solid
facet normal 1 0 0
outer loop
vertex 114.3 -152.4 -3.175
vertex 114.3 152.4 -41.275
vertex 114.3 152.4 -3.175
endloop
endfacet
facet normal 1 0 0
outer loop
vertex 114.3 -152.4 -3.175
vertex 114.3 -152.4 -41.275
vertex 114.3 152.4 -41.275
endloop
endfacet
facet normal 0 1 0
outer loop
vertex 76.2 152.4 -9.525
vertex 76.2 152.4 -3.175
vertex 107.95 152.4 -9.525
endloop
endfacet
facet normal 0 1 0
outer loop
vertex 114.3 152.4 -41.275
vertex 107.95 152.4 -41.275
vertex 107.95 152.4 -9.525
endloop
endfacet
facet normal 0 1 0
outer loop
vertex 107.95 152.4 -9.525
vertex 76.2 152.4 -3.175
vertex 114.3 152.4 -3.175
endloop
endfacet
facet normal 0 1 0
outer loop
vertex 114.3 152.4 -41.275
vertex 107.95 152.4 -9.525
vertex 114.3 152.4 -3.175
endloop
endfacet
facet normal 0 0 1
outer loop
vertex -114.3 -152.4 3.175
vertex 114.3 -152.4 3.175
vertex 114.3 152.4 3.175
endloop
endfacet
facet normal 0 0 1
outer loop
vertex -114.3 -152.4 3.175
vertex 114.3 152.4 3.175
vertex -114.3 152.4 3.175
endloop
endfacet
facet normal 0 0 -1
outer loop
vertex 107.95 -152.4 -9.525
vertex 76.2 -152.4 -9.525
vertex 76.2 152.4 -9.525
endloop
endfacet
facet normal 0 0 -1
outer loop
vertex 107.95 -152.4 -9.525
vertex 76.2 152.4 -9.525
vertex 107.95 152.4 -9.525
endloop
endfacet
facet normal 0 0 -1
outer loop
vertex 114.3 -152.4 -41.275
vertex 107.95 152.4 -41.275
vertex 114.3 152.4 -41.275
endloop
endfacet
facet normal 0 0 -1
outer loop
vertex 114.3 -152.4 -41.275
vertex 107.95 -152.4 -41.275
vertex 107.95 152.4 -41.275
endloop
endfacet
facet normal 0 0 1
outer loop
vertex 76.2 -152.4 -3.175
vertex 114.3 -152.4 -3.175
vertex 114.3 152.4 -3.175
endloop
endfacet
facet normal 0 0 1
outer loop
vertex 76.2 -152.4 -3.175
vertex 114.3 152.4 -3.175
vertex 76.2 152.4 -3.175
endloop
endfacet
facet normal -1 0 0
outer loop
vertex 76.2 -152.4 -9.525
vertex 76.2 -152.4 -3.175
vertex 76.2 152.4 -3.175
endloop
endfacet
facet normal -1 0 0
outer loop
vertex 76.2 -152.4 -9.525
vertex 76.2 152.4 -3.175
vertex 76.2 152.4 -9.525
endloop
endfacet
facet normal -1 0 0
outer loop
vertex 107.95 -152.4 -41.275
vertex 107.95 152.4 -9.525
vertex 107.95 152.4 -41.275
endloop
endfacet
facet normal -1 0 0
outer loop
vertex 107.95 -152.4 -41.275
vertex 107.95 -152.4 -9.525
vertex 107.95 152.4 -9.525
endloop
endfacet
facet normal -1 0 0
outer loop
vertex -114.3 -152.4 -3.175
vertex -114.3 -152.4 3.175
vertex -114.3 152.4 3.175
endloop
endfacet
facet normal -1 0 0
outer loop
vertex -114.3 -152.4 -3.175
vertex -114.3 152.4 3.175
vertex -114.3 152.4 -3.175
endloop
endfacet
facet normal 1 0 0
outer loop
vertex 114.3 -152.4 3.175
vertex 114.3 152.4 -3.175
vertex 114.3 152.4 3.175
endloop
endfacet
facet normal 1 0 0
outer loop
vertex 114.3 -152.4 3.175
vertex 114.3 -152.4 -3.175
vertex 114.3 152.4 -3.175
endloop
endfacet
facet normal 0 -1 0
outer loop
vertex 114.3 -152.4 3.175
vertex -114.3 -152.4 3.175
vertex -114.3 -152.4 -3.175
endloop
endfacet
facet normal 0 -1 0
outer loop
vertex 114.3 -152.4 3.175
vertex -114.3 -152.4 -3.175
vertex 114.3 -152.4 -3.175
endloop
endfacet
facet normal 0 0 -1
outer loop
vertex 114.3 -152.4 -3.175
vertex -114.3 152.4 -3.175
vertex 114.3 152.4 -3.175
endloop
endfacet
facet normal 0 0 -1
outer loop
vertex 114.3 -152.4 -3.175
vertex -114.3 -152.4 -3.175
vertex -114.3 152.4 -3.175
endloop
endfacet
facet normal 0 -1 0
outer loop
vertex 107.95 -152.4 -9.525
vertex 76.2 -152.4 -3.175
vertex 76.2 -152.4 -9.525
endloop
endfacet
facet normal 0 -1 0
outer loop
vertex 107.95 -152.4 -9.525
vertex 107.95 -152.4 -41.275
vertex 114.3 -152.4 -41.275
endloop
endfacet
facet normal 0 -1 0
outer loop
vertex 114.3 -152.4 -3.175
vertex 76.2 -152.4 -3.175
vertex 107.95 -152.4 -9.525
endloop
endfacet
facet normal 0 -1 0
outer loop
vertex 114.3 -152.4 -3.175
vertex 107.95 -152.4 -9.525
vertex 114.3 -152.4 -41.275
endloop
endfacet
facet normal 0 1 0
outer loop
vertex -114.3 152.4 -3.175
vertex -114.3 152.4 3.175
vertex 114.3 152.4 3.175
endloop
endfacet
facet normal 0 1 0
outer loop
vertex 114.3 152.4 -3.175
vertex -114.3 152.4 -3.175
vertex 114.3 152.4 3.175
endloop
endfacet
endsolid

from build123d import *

# Parameters (mm, degrees)
F1_DEPTH = 152.4
F2_DEPTH = 152.4


with BuildPart() as f1:
    # F0 (on Front) → F1 (new body, symmetric)
    with BuildSketch(Plane.XZ):
        Polygon((76.2, -3.175), (114.3, -3.175), (114.3, 3.175), (-114.3, 3.175), (-114.3, -3.175), align=None)
    extrude(amount=F1_DEPTH, both=True)


with BuildPart() as f2:
    # F0 (on Front) → F2 (new body, symmetric)
    with BuildSketch(Plane.XZ):
        Polygon((114.3, -41.275), (114.3, -3.175), (76.2, -3.175), (76.2, -9.525), (107.95, -9.525), (107.95, -41.275), align=None)
    extrude(amount=F2_DEPTH, both=True)


solid = Compound([f1.part, f2.part])
